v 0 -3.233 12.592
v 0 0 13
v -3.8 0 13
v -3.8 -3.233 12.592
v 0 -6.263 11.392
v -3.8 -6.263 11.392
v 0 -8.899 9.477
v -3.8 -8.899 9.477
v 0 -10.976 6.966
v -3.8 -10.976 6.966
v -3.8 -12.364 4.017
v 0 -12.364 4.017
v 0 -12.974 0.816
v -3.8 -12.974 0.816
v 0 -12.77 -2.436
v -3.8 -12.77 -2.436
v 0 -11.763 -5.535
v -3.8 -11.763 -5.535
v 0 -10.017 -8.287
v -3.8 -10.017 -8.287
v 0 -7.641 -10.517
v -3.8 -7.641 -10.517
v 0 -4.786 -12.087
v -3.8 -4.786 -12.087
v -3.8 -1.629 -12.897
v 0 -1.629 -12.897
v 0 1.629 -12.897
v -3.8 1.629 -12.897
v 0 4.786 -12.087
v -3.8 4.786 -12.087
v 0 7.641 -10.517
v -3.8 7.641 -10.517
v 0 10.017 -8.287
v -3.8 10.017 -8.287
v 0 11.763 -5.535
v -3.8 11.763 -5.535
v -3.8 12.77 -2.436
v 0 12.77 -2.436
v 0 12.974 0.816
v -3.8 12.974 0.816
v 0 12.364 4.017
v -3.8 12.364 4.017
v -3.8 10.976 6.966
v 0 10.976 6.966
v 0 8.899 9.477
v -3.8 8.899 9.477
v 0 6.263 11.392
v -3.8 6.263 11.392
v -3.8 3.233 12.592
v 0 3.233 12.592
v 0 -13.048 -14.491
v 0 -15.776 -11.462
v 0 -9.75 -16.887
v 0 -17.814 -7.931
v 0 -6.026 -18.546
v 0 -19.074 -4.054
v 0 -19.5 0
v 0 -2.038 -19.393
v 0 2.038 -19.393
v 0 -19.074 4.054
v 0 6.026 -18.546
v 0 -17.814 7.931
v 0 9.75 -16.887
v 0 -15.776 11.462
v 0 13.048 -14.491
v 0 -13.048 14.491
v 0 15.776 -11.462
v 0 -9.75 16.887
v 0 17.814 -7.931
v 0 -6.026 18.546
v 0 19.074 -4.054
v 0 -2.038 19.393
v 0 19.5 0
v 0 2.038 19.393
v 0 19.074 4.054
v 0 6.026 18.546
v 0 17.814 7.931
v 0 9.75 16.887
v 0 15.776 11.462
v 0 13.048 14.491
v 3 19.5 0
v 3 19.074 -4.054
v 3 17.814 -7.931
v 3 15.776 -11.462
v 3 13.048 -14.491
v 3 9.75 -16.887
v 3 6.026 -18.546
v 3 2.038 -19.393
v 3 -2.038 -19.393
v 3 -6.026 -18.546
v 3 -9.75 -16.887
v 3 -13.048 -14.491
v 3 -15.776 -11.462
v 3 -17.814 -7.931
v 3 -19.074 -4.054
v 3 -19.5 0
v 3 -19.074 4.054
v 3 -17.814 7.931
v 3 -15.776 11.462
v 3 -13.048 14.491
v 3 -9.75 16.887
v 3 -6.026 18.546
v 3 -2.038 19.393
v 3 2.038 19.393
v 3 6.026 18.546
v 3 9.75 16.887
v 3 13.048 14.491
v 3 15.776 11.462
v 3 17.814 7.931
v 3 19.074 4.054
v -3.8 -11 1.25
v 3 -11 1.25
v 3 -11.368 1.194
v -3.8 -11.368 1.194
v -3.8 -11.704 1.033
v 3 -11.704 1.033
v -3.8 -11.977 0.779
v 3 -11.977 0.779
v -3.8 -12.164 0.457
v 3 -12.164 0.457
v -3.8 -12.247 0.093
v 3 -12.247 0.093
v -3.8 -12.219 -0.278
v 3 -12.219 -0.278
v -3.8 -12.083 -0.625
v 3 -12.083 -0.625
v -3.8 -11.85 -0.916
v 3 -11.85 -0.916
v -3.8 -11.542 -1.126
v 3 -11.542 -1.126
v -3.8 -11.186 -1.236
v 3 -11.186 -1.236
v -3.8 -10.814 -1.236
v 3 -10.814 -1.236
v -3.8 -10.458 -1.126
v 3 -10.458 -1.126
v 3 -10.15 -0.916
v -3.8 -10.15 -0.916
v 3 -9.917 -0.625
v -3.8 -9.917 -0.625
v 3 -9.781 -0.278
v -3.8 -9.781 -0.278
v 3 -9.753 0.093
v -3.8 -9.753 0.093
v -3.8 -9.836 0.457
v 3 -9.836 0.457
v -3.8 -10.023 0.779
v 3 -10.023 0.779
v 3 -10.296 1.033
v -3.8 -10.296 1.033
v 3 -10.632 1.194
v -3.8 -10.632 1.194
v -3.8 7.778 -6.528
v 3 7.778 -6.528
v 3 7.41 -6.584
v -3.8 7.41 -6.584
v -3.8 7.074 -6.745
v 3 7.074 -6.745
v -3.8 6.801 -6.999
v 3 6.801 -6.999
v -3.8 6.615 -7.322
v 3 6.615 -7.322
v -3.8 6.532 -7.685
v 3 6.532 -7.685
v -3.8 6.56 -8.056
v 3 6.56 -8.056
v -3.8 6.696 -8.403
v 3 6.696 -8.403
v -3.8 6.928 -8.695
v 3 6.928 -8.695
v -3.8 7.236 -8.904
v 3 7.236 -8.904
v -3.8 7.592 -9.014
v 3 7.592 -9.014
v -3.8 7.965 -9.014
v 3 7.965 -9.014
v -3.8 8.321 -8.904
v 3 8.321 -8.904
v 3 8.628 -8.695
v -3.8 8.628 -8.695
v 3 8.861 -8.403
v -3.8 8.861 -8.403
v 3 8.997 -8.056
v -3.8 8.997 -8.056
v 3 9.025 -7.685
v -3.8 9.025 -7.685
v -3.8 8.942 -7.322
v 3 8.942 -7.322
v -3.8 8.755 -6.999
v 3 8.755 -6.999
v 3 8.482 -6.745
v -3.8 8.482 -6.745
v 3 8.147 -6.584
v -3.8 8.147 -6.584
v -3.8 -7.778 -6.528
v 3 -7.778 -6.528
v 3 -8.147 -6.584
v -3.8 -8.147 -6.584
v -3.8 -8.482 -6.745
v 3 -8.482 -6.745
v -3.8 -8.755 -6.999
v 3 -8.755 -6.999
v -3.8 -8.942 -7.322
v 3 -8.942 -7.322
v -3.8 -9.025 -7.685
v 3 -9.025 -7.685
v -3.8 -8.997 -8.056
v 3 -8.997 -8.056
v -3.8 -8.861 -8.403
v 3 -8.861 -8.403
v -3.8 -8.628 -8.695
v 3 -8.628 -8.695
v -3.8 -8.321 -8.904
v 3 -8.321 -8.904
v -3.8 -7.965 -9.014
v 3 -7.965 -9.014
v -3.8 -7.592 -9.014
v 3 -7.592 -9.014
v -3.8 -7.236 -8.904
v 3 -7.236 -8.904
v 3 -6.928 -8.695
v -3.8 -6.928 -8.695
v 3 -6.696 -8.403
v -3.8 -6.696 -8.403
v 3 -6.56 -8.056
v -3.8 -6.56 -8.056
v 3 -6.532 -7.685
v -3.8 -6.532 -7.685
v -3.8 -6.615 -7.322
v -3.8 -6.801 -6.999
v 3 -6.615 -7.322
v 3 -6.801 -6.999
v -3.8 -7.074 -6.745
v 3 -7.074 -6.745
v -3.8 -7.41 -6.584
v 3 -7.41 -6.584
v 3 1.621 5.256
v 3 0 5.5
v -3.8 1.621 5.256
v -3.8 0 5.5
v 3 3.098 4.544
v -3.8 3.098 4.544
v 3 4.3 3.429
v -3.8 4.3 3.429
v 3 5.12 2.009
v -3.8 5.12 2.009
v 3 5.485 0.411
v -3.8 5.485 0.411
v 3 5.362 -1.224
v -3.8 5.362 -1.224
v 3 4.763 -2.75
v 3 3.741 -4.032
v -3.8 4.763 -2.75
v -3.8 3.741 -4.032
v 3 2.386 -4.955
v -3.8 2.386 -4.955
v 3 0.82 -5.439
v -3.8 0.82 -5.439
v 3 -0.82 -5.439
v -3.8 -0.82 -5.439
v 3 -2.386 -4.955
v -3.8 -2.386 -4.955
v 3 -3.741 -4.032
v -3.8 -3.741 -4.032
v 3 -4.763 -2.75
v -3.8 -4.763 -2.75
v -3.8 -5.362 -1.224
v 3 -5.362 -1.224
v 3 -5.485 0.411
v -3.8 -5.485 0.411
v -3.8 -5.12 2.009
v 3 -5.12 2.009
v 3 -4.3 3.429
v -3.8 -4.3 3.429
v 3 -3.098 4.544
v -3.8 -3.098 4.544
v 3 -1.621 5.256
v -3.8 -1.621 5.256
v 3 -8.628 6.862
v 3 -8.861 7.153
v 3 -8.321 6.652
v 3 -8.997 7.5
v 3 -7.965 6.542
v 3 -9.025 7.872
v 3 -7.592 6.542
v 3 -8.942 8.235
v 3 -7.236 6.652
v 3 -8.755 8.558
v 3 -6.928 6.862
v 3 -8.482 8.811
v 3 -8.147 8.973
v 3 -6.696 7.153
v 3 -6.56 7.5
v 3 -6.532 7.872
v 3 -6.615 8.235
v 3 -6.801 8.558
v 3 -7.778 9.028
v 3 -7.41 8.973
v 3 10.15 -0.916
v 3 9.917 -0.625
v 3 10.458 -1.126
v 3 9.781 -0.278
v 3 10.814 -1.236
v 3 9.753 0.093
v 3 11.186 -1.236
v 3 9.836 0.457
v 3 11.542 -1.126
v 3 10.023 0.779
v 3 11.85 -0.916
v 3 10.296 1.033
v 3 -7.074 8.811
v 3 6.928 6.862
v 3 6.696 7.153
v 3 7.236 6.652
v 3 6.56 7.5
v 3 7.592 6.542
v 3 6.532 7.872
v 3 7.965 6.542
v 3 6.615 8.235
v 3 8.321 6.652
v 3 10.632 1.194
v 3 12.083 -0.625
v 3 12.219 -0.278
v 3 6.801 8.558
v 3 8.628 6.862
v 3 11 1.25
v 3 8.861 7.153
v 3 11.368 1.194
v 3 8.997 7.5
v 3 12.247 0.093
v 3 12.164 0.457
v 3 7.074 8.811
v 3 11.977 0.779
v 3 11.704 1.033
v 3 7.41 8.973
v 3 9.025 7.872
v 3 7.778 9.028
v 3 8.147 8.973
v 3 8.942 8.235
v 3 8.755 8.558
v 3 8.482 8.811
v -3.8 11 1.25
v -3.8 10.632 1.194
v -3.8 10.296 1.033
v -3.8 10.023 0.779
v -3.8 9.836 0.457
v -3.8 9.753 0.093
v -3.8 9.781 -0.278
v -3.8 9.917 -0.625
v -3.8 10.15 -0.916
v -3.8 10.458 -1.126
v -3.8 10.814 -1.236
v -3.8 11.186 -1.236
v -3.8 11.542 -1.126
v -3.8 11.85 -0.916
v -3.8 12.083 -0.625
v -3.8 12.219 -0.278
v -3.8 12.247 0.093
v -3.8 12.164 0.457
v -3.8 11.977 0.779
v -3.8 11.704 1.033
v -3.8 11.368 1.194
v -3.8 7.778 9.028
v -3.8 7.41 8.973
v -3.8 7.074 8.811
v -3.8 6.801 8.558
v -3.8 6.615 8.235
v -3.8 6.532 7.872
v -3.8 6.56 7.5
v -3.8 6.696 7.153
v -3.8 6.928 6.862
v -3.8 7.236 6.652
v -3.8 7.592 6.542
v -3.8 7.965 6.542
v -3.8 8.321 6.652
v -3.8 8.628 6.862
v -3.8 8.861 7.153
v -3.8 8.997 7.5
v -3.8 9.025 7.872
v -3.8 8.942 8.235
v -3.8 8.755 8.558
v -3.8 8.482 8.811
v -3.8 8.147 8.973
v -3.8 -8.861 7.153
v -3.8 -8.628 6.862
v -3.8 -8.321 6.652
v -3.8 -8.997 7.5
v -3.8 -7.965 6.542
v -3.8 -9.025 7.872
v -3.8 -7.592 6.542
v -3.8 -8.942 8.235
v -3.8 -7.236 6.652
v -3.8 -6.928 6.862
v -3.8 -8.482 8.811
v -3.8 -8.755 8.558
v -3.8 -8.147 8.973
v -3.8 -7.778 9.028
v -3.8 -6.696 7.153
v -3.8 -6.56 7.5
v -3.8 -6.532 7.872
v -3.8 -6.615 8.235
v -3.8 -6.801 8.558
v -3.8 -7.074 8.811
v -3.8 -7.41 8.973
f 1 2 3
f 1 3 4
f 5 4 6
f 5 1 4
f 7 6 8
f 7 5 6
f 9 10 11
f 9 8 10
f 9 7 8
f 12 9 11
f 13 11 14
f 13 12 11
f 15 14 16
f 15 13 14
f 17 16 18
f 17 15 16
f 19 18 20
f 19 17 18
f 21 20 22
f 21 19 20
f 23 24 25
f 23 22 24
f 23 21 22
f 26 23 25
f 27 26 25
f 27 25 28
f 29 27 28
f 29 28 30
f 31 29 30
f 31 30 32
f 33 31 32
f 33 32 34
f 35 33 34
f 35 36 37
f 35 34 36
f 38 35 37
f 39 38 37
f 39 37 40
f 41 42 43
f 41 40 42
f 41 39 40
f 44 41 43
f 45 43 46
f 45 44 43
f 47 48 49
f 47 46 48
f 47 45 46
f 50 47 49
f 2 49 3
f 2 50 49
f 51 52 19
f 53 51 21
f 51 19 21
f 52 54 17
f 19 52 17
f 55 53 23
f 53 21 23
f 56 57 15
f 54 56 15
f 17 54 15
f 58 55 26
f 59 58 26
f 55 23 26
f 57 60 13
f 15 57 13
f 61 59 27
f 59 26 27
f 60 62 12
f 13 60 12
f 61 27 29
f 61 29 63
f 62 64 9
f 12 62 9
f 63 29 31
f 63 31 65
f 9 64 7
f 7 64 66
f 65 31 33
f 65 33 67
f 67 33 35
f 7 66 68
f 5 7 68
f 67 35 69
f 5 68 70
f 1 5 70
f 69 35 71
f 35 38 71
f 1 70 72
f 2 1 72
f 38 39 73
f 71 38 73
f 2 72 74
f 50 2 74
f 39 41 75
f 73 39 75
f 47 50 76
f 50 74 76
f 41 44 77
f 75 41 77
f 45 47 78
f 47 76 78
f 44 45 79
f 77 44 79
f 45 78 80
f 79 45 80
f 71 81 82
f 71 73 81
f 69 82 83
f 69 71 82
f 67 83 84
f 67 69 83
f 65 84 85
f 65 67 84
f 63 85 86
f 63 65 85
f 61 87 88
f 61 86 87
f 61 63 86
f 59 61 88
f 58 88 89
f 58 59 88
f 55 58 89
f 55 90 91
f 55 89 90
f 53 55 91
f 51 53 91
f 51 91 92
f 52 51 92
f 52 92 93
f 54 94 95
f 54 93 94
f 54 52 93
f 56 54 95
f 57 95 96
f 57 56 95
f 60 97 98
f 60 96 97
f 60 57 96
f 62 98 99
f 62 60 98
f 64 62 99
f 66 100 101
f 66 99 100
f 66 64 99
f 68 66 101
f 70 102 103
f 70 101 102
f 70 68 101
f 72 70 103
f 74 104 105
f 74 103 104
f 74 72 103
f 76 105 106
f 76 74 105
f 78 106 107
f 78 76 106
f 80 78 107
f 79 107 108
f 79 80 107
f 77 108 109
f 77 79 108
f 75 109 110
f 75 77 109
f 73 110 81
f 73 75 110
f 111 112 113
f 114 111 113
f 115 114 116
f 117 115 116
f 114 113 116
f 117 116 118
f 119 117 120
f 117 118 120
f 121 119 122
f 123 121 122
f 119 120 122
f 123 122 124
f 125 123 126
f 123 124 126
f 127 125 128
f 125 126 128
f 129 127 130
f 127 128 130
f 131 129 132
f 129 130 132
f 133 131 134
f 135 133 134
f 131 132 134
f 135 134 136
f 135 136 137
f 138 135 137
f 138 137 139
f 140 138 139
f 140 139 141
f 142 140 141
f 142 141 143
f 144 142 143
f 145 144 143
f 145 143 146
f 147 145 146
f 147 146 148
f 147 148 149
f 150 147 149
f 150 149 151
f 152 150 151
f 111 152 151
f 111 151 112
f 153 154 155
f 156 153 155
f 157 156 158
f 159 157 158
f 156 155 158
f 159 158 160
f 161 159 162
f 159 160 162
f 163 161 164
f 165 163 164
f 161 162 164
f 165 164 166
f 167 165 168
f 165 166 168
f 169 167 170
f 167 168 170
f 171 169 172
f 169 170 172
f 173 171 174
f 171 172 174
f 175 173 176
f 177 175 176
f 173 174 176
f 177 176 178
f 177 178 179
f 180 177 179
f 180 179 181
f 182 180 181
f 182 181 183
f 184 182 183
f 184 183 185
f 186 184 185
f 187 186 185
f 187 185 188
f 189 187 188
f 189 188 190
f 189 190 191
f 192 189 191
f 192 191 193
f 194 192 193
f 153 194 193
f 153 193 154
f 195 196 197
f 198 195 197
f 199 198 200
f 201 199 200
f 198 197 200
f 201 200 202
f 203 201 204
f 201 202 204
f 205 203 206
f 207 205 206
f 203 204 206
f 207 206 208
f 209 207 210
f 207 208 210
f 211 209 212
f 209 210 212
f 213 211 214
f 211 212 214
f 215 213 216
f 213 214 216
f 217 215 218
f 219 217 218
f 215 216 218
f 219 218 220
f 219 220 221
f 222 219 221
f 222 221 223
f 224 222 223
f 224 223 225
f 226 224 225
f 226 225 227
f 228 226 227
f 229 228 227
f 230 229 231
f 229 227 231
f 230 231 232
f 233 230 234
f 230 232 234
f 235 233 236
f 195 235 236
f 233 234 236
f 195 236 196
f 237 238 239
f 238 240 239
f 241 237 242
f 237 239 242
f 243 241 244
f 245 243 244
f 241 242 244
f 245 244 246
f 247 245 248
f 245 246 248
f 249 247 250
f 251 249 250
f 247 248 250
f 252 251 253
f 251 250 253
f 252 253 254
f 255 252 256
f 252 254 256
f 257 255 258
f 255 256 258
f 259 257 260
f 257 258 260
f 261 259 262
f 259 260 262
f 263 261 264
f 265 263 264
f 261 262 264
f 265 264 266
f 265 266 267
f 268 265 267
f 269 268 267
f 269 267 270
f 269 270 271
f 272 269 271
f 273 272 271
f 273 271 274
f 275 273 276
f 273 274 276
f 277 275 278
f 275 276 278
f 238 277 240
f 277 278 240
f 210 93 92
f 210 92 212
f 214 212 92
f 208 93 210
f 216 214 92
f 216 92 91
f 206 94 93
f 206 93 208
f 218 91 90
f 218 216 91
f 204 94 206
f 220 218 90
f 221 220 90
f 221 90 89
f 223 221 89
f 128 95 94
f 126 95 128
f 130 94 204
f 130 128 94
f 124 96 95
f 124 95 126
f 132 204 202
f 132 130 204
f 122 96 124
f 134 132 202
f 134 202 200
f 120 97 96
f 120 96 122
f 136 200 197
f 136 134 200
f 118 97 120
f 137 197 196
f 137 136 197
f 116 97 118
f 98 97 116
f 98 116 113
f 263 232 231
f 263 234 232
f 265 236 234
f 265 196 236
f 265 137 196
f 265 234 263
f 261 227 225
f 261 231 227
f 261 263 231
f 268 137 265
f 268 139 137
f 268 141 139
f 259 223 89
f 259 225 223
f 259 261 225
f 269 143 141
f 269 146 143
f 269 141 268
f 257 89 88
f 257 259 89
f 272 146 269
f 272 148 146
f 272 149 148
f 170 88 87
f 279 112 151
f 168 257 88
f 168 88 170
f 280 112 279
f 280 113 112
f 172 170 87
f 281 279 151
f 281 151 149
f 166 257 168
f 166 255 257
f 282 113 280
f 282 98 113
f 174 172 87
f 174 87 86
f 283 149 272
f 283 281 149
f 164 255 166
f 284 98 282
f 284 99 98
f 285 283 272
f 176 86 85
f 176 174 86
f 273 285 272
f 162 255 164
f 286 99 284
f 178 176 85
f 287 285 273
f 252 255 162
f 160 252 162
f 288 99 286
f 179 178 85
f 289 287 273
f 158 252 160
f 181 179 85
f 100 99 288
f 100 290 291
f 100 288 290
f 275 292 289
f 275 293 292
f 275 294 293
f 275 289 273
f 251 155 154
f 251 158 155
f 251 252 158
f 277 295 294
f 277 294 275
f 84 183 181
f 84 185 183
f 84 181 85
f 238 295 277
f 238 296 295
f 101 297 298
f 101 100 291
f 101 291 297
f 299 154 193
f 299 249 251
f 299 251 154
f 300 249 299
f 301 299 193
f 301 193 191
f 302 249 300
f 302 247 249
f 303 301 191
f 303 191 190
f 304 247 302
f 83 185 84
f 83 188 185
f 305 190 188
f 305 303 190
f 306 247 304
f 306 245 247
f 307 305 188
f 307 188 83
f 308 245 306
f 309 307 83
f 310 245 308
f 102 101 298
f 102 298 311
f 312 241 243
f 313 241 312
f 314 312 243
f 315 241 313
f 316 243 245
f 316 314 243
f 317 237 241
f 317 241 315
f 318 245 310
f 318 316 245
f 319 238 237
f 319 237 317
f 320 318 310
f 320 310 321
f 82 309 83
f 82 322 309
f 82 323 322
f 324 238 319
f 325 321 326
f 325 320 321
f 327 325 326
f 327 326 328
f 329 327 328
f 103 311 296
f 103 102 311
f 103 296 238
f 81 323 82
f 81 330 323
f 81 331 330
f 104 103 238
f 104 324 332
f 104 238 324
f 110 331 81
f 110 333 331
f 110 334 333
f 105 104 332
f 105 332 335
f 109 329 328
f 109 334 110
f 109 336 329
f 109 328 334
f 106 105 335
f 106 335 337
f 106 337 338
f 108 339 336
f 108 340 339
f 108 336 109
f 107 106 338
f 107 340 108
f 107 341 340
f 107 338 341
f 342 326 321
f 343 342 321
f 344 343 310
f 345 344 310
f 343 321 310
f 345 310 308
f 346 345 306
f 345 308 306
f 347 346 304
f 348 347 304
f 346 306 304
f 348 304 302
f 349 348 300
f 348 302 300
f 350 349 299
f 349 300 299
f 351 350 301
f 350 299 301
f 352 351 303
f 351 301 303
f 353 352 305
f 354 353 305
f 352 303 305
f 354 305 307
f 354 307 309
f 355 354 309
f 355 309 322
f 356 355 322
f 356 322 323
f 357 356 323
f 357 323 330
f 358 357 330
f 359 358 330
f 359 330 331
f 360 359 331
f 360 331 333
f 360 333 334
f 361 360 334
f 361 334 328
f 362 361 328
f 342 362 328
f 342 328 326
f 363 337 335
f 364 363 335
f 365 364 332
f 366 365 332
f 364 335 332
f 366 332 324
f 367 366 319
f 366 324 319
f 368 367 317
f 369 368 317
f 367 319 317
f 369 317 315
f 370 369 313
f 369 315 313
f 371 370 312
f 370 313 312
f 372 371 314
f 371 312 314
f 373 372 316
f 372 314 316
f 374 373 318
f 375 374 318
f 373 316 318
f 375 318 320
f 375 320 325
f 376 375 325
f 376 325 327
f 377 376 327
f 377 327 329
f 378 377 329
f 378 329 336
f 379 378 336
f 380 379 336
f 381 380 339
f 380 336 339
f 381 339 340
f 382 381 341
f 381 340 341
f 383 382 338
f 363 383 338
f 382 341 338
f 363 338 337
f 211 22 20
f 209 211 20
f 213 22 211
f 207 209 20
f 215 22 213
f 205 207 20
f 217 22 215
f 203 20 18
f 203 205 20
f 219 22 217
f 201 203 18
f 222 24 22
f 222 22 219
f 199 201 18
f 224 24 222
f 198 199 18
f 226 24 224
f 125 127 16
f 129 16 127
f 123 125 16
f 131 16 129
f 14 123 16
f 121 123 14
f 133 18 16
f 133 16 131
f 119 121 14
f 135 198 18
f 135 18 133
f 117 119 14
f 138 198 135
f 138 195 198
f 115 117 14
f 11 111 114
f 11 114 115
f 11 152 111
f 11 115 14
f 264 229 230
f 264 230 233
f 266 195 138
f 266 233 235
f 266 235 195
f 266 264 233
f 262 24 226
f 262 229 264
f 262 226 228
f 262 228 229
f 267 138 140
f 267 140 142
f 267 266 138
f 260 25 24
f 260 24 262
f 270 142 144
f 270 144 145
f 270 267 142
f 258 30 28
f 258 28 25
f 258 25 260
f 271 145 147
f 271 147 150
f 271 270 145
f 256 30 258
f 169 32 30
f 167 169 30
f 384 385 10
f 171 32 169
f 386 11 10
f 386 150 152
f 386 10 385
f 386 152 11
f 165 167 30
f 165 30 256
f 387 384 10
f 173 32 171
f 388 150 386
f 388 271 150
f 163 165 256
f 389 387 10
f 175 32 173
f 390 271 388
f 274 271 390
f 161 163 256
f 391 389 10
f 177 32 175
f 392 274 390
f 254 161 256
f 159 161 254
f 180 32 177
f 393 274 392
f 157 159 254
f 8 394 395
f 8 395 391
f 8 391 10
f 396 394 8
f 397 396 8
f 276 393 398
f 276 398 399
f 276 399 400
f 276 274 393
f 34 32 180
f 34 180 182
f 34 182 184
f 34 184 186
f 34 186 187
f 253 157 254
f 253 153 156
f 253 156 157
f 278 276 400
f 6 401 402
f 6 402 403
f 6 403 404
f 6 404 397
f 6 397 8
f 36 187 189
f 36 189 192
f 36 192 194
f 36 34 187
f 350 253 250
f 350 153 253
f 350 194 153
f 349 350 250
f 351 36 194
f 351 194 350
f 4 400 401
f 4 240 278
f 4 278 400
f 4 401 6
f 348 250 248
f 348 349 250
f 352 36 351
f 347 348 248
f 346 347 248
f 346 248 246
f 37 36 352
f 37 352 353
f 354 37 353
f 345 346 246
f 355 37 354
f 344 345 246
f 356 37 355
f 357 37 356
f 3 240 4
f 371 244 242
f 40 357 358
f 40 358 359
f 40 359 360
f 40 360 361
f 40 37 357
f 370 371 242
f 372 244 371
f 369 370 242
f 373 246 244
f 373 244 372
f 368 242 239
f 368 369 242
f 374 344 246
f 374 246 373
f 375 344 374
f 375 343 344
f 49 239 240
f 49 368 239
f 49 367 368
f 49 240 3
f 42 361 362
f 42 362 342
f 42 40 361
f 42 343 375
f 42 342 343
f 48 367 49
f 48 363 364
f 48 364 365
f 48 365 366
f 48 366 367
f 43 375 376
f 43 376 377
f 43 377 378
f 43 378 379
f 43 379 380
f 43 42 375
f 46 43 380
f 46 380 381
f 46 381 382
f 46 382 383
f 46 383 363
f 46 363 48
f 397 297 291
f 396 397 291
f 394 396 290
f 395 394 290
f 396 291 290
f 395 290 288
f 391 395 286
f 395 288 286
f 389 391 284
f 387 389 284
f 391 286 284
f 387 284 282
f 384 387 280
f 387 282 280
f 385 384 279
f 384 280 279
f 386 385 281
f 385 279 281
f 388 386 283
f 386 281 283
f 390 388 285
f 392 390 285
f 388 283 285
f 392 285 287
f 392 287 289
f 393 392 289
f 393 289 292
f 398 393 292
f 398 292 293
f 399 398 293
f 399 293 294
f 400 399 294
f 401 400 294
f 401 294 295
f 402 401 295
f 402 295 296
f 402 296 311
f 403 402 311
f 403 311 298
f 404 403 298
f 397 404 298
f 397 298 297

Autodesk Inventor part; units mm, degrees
ref_plane "YZ Plane" through (0, 0, 0) normal (1, 0, 0) x (0, 1, 0)
ref_plane "XZ Plane" through (0, 0, 0) normal (0, 1, 0) x (-1, 0, 0)
ref_plane "XY Plane" through (0, 0, 0) normal (0, 0, 1) x (1, 0, 0)
sketch "スケッチ1" plane through (0, 0, 0) normal (1, 0, 0) x (0, 1, 0)
  circle A0 centre (0, 0) radius 19.5
  dimension "d0" = 39
extrude "押し出し1" add sketch "スケッチ1" along normal blind 3
sketch "スケッチ2" plane through (0, 0, 0) normal (-1, 0, 0) x (0, 0, 1)
  circle A0 centre (0, 0) radius 11
  point P0 (0, 11)
  point P1 (-7.7782, 7.7782)
  point P2 (-11, 0)
  point P3 (-7.7782, -7.7782)
  point P4 (0, -11)
  point P5 (7.7782, -7.7782)
  point P6 (11, 0)
  point P7 (7.7782, 7.7782)
  dimension "d3" = 22
  dimension "d6" = 360
hole "穴1" at (0, 7.7782, -7.7782) at (0, 11, 0) at (0, 7.7782, 7.7782) at (0, -7.7782, 7.7782) at (0, -11, 0) at (0, -7.7782, -7.7782) direction (1, 0, 0) diameter 2.5 end through all
sketch "スケッチ3" plane through (3, 0, 0) normal (1, 0, 0) x (0, 0, -1)
  circle A0 centre (-7.7782, 7.7782) radius 1.25 projected
  circle A1 centre (0, 11) radius 1.25 projected
  circle A2 centre (7.7782, 7.7782) radius 1.25 projected
  circle A3 centre (7.7782, -7.7782) radius 1.25 projected
  circle A4 centre (0, -11) radius 1.25 projected
  circle A5 centre (-7.7782, -7.7782) radius 1.25 projected
  point P0 (0, 0)
hole "穴2" [suppressed]
sketch "スケッチ4" plane through (0, 0, 0) normal (-1, 0, 0) x (0, 0, 1)
  circle A0 centre (0, 0) radius 19.5 projected
  circle A1 centre (0, 0) radius 13
  dimension "d22" = 26
extrude "押し出し2" add sketch "スケッチ4" along normal blind 3.8 contours A1
sketch "スケッチ5" plane through (-3.8, 0, 0) normal (-1, 0, 0) x (0, 0, 1)
  point P0 (0, 0)
  point P1 (0, 11)
  point P2 (0, 11)
  point P3 (-7.7782, 7.7782)
  point P4 (-11, 0)
  point P5 (-7.7782, -7.7782)
  point P6 (0, -11)
  point P7 (7.7782, -7.7782)
  point P8 (11, 0)
  point P9 (7.7782, 7.7782)
  dimension "d27" = 360
hole "穴3" at (-3.8, 11, 0) at (-3.8, 7.7782, -7.7782) at (-3.8, 7.7782, 7.7782) at (-3.8, -7.7782, 7.7782) at (-3.8, -11, 0) at (-3.8, -7.7782, -7.7782) direction (1, 0, 0) diameter 2.5 end through all
sketch "スケッチ6" plane through (-3.8, 0, 0) normal (-1, 0, 0) x (0, 0, 1)
  circle A0 centre (0, 0) radius 5.5
  dimension "d36" = 11
extrude "押し出し3" cut sketch "スケッチ6" against normal blind 10
properties part number "connectplate5" material "アルミニウム 6061"
